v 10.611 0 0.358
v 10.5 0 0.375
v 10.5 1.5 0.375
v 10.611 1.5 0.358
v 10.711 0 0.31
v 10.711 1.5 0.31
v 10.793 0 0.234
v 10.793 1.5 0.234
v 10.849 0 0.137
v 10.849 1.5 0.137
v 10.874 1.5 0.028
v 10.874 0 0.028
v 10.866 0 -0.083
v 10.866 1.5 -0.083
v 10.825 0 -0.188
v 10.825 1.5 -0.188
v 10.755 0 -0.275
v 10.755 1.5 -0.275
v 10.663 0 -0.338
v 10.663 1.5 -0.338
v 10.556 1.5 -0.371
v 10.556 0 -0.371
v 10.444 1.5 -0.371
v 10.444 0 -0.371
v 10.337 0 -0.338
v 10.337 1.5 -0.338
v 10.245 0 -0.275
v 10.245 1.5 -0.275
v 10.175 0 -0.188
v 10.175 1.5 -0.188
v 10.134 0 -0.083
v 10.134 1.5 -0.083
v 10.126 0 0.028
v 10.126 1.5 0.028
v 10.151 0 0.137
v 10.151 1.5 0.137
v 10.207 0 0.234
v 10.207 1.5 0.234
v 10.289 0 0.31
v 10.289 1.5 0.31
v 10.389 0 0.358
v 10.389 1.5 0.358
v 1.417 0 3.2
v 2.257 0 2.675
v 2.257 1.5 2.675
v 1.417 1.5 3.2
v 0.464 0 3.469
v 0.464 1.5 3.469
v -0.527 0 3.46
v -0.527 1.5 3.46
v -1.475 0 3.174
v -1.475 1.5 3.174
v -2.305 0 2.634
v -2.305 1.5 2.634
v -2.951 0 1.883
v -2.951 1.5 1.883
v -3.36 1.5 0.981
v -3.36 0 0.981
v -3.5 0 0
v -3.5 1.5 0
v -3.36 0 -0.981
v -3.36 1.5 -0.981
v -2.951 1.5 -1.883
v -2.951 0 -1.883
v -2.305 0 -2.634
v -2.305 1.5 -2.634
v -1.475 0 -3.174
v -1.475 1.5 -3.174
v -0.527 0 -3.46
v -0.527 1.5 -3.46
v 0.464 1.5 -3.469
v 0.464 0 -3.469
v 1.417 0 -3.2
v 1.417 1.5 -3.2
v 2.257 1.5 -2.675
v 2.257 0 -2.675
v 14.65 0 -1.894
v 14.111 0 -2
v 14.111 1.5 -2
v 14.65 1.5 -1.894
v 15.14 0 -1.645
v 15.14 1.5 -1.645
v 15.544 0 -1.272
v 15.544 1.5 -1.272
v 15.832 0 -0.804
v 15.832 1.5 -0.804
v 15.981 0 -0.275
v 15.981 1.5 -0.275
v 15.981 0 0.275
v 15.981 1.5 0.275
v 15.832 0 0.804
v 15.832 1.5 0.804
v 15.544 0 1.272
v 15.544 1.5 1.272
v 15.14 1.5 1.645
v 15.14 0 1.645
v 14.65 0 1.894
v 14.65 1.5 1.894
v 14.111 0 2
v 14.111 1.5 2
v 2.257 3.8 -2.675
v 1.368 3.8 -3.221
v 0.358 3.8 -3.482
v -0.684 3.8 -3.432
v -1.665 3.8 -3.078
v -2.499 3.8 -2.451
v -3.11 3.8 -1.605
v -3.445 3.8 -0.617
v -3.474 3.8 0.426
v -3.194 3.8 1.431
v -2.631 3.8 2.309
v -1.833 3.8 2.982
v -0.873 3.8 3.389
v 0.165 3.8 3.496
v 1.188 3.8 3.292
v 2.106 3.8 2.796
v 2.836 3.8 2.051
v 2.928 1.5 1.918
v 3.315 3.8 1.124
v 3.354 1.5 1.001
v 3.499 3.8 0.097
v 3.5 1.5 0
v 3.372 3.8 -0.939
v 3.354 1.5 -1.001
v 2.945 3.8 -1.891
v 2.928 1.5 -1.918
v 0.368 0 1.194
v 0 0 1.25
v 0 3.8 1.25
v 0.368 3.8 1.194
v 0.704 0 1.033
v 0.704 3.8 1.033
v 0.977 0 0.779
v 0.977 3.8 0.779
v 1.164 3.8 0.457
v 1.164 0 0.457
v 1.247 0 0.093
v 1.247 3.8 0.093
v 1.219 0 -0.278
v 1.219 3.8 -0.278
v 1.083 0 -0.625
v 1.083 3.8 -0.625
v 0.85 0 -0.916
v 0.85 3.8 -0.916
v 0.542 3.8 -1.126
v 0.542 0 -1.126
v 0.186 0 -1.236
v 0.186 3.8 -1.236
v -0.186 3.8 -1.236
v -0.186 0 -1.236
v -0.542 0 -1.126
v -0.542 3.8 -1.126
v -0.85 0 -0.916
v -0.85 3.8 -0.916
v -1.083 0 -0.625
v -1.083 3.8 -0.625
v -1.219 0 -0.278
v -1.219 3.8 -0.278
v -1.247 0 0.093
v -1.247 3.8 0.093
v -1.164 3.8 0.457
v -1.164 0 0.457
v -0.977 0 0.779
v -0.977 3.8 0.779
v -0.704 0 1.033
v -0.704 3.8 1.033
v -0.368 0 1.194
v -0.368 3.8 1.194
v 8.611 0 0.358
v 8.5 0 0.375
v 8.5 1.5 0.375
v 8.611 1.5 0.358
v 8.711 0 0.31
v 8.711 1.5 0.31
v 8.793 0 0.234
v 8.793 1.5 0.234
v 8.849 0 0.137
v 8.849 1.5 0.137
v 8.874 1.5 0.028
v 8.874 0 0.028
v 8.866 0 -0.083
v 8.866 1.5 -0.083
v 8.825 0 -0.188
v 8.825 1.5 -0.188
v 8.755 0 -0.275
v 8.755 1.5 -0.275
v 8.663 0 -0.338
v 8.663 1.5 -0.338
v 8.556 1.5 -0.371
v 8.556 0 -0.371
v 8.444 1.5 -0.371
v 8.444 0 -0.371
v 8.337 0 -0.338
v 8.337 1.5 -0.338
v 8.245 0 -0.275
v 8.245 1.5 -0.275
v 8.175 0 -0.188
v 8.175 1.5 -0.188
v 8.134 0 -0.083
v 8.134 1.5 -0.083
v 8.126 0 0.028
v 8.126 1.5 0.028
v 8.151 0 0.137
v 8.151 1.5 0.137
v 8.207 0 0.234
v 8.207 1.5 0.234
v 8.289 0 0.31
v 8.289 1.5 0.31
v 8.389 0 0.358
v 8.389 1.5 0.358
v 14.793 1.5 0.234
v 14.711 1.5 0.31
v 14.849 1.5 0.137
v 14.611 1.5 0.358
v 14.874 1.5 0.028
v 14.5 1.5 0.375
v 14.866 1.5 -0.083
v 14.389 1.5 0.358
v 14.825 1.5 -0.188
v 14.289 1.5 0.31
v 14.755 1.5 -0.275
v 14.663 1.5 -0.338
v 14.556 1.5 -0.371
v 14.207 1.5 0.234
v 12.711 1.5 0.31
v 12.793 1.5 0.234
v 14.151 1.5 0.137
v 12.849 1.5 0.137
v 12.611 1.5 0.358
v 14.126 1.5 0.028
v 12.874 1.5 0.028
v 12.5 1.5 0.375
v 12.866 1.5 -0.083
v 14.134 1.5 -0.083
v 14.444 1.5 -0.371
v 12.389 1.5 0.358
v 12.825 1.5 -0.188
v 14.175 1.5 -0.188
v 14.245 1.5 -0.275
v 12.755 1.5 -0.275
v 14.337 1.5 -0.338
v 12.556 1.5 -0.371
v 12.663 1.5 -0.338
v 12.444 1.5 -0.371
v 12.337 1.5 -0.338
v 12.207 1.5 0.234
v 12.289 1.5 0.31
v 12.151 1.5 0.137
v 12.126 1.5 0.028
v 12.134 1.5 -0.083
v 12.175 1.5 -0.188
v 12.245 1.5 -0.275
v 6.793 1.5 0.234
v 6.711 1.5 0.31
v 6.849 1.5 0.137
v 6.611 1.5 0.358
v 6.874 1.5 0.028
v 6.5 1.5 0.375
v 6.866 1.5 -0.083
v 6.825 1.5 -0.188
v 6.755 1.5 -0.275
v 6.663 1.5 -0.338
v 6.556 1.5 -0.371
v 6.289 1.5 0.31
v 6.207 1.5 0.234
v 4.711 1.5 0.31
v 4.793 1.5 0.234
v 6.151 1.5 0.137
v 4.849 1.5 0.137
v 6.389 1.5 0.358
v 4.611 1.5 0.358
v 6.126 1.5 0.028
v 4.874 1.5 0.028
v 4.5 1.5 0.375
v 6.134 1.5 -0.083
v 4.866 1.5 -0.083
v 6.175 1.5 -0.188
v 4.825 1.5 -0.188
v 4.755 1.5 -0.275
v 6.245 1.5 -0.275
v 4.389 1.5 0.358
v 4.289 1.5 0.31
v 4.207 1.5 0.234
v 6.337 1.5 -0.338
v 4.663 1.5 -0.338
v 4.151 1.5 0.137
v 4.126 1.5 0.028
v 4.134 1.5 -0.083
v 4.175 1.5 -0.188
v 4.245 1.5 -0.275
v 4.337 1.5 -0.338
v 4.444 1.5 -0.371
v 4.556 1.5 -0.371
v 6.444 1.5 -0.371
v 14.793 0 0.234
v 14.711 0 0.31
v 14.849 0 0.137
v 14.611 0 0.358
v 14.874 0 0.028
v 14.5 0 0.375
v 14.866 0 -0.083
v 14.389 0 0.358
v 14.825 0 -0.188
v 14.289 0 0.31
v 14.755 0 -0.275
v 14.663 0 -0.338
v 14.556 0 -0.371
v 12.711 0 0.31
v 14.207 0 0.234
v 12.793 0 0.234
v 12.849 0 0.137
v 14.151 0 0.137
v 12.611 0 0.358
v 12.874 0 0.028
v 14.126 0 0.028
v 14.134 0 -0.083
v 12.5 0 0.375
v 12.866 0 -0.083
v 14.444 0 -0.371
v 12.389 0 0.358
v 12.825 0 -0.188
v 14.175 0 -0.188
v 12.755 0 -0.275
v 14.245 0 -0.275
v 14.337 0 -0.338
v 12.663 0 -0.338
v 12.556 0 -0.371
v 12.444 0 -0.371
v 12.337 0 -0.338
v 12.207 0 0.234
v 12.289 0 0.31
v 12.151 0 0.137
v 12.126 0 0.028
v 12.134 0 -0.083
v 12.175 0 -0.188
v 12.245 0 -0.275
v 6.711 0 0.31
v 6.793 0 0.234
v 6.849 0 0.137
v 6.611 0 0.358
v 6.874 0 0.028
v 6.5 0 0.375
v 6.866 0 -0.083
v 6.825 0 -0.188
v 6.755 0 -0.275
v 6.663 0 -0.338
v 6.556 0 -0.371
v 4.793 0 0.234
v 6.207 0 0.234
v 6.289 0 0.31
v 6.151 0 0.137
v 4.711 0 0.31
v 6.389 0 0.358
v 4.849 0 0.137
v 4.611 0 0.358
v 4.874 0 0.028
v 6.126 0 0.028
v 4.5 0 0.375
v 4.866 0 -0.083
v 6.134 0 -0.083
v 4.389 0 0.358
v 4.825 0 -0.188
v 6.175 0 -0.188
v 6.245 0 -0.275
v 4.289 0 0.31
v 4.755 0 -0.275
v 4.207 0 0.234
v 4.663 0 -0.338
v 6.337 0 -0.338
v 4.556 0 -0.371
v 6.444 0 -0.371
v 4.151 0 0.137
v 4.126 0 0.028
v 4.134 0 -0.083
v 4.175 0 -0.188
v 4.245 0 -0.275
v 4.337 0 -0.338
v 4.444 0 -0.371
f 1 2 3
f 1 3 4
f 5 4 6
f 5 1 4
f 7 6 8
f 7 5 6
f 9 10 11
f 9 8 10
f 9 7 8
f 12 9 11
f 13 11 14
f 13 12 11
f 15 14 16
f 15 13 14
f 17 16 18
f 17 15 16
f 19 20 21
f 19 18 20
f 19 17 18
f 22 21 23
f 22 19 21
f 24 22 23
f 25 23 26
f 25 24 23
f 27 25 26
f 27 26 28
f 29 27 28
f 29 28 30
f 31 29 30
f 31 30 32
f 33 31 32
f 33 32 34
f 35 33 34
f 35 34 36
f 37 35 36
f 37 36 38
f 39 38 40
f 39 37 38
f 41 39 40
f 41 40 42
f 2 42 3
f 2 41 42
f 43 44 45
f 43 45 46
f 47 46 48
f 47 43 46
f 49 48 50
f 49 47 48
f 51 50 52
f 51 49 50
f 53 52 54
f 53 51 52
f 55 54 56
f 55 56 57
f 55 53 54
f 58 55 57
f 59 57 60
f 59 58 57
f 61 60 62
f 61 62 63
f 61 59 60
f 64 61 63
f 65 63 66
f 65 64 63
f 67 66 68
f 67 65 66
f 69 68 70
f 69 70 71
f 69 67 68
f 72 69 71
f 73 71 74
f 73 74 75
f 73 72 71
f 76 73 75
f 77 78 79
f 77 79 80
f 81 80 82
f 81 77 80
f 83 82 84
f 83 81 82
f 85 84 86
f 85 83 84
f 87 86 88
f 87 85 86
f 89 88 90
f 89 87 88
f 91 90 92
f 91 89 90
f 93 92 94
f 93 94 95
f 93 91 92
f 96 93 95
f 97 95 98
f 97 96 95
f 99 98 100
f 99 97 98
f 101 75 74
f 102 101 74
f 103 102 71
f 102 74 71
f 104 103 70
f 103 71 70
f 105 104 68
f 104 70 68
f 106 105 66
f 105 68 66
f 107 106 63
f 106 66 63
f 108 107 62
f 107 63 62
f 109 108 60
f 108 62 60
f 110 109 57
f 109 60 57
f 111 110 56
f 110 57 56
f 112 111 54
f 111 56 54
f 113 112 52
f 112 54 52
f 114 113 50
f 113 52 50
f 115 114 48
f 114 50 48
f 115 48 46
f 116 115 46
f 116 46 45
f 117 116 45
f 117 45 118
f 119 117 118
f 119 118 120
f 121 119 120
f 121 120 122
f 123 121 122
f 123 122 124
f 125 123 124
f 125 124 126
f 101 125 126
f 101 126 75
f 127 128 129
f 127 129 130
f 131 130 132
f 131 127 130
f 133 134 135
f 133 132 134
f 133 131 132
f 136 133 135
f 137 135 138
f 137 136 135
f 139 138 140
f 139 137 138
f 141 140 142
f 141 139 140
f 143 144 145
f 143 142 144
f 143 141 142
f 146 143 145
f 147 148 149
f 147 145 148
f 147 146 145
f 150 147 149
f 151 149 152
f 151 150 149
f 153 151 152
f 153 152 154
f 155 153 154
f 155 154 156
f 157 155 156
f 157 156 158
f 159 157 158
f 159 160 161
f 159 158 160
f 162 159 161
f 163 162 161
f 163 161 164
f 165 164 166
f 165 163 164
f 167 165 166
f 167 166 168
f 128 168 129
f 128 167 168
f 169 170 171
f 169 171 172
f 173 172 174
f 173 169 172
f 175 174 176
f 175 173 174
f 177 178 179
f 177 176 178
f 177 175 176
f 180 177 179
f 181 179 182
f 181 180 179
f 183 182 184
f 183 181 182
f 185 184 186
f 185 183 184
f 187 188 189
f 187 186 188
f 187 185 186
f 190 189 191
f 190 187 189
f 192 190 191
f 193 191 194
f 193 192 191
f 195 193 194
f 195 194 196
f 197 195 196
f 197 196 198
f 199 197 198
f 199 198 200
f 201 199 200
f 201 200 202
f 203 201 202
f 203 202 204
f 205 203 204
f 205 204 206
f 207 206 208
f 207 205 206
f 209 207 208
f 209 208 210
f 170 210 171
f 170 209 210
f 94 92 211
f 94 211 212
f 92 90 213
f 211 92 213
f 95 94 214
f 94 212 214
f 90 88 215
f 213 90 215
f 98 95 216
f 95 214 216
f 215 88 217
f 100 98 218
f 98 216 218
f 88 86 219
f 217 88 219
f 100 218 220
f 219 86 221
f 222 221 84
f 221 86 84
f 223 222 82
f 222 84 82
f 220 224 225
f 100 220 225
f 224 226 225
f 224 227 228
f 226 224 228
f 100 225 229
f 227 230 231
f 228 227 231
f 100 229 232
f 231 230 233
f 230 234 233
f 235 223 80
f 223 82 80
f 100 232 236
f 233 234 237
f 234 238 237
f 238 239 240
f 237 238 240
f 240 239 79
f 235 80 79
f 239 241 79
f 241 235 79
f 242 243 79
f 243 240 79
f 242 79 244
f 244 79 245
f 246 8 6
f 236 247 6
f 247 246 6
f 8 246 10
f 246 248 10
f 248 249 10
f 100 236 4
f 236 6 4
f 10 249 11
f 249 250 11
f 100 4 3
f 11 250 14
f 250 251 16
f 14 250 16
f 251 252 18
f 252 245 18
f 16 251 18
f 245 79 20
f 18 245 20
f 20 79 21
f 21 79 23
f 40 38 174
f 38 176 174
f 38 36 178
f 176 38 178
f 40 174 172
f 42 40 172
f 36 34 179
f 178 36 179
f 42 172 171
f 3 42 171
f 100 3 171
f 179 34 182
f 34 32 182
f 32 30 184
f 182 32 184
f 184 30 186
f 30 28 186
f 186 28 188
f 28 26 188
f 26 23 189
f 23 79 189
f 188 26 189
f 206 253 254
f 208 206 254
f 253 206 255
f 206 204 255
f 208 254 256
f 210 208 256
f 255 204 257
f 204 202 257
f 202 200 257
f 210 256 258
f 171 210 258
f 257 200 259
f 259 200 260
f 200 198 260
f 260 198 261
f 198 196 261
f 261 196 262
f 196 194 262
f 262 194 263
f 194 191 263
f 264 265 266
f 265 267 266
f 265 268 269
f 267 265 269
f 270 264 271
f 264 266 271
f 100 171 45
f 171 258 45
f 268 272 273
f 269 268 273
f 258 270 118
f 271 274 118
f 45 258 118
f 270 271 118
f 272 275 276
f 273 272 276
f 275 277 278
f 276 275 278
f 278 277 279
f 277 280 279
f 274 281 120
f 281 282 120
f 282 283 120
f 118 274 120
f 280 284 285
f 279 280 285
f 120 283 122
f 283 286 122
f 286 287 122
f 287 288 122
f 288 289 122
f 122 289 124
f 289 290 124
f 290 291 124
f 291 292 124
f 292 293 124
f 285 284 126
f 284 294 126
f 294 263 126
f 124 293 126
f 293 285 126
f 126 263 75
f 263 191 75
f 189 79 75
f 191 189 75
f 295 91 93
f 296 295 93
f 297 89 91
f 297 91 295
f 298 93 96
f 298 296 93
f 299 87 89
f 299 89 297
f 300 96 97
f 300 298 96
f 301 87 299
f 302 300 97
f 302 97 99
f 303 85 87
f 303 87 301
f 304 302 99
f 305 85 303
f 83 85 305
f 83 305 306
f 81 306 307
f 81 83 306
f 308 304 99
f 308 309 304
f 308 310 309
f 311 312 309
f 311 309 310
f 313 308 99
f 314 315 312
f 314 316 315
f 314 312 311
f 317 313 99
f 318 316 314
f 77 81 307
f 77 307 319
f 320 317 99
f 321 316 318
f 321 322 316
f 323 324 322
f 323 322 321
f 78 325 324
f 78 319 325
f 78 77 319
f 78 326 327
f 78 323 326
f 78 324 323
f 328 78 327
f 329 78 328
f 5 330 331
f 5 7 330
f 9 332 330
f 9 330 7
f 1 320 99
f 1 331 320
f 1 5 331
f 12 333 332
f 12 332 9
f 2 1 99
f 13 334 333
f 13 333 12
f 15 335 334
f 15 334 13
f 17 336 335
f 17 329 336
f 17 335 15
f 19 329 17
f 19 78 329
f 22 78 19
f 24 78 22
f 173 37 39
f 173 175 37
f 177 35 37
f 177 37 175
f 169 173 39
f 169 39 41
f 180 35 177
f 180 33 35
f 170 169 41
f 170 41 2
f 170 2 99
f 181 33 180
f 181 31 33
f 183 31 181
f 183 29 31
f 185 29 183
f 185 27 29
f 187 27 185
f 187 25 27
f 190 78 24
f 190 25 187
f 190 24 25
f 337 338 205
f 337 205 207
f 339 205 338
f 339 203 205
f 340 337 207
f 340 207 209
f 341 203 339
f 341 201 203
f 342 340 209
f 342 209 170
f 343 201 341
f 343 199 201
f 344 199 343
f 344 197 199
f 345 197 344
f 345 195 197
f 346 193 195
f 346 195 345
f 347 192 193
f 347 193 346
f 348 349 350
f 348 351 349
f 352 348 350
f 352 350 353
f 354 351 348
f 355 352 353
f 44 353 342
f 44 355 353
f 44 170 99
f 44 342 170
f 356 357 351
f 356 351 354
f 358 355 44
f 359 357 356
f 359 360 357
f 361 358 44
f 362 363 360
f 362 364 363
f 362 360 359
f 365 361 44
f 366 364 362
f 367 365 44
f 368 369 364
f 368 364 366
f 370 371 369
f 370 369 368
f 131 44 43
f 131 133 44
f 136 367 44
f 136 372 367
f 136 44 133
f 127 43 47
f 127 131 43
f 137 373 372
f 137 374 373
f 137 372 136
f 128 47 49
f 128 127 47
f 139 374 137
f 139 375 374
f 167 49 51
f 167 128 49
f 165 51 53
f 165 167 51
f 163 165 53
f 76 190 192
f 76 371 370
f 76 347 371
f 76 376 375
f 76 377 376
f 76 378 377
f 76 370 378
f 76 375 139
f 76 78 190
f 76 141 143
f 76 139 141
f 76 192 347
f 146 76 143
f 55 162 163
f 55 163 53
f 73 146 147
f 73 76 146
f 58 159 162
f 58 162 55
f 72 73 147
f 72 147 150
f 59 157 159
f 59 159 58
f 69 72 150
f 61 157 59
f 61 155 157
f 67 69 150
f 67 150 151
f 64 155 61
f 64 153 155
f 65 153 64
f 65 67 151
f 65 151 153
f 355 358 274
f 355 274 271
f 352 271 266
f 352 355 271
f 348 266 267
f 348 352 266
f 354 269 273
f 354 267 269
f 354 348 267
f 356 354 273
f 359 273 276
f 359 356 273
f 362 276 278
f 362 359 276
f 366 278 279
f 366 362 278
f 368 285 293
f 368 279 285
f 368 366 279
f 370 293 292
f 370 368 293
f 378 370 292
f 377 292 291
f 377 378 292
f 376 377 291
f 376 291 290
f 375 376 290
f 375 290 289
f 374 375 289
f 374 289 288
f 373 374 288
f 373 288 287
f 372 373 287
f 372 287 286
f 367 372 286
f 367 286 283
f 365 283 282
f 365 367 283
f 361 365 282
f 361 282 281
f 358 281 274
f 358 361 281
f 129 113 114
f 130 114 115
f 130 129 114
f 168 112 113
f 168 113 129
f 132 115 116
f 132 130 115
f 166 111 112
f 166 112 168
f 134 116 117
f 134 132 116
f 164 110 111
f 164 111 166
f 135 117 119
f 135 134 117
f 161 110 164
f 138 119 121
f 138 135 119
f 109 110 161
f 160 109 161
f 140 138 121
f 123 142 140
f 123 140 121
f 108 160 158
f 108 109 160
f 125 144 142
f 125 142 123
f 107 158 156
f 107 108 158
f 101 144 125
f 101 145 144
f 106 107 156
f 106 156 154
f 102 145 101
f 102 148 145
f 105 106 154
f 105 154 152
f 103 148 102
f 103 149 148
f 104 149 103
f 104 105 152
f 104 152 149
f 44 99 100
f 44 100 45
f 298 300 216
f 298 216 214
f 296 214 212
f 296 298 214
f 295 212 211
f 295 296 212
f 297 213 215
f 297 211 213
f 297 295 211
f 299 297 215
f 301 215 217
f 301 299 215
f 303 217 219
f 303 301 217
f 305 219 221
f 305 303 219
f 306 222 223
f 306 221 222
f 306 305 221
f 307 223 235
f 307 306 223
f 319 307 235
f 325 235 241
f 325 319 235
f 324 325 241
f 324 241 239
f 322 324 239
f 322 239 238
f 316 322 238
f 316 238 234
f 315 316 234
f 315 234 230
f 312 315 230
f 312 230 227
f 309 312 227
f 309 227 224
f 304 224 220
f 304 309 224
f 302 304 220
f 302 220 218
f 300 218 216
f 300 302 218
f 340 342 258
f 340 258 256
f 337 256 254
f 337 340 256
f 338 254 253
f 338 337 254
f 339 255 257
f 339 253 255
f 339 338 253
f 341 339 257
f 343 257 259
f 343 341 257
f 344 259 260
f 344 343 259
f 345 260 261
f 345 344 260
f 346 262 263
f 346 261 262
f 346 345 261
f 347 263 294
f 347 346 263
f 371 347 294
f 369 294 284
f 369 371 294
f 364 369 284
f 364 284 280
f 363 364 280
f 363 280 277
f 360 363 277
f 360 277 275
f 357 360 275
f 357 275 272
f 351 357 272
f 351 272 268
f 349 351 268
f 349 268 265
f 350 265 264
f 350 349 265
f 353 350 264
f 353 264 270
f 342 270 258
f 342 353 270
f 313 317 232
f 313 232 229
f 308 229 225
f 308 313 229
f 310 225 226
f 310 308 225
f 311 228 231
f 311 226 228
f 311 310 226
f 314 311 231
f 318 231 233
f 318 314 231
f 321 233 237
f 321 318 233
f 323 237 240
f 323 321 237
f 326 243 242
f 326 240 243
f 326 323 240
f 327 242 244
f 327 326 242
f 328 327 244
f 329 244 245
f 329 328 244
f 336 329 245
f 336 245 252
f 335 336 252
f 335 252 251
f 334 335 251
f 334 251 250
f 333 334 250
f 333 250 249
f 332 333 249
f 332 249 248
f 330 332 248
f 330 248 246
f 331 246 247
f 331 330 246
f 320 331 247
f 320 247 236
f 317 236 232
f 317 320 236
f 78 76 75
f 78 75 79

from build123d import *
from build123d.topology import SkipClean

# Parameters (mm, degrees)
BOSS_EXTRUDE1_DEPTH     = 1.5
SKETCH2_R               = 3.5
BOSS_EXTRUDE2_DEPTH     = 2.3
CUT_EXTRUDE1_DEPTH      = 17.539044712
CUT_EXTRUDE1_DEPTH_BACK = 17.539044712
SKETCH3_R               = 0.375
SKETCH3_R_2             = 1.25


with BuildPart() as part:
    # Sketch1 → Boss-Extrude1 (new body)
    with BuildSketch(Plane(origin=(0, 0, 0), x_dir=(1, 0, 0), z_dir=(0, 1, 0))):
        with BuildLine():
            Line((2.257072219, 2.675), (14.110649579, 2))
            ThreePointArc((14.110649579, 2), (16, 0), (14.110649579, -2))
            Line((14.110649579, -2), (2.257072219, -2.675))
            ThreePointArc((2.257072219, -2.675), (-3.5, 0), (2.257072219, 2.675))
        make_face()
    extrude(amount=BOSS_EXTRUDE1_DEPTH)

    # Sketch2 → Boss-Extrude2 (add)
    with SkipClean():  # the faces are left unmerged after this step: merging them gives an invalid solid
        with BuildSketch(Plane(origin=(0, 1.5, 0), x_dir=(1, 0, 0), z_dir=(0, 1, 0))):
            with Locations(Location((0, 0, 0), (0, 0, 49.843487791))):
                Circle(SKETCH2_R)
        extrude(amount=BOSS_EXTRUDE2_DEPTH)

    # Sketch3 → Cut-Extrude1 (cut, two sides: drawn at the far end of the back side and taken through both)
    with SkipClean():  # the faces are left unmerged after this step: merging them gives an invalid solid
        with BuildSketch(Plane(origin=(0, 1.5, 0), x_dir=(1, 0, 0), z_dir=(0, 1, 0)).offset(-CUT_EXTRUDE1_DEPTH_BACK)):
            with Locations(Location((4.5, 0, 0), (0, 0, 270))):
                Circle(SKETCH3_R)
            with Locations(Location((0, 0, 0), (0, 0, 270))):
                Circle(SKETCH3_R_2)
            with Locations(Location((6.5, 0, 0), (0, 0, 270))):
                Circle(SKETCH3_R)
            with Locations(Location((8.5, 0, 0), (0, 0, 270))):
                Circle(SKETCH3_R)
            with Locations(Location((10.5, 0, 0), (0, 0, 270))):
                Circle(SKETCH3_R)
            with Locations(Location((12.5, 0, 0), (0, 0, 270))):
                Circle(SKETCH3_R)
            with Locations(Location((14.5, 0, 0), (0, 0, 270))):
                Circle(SKETCH3_R)
        extrude(amount=CUT_EXTRUDE1_DEPTH + CUT_EXTRUDE1_DEPTH_BACK, mode=Mode.SUBTRACT)


solid = part.part
